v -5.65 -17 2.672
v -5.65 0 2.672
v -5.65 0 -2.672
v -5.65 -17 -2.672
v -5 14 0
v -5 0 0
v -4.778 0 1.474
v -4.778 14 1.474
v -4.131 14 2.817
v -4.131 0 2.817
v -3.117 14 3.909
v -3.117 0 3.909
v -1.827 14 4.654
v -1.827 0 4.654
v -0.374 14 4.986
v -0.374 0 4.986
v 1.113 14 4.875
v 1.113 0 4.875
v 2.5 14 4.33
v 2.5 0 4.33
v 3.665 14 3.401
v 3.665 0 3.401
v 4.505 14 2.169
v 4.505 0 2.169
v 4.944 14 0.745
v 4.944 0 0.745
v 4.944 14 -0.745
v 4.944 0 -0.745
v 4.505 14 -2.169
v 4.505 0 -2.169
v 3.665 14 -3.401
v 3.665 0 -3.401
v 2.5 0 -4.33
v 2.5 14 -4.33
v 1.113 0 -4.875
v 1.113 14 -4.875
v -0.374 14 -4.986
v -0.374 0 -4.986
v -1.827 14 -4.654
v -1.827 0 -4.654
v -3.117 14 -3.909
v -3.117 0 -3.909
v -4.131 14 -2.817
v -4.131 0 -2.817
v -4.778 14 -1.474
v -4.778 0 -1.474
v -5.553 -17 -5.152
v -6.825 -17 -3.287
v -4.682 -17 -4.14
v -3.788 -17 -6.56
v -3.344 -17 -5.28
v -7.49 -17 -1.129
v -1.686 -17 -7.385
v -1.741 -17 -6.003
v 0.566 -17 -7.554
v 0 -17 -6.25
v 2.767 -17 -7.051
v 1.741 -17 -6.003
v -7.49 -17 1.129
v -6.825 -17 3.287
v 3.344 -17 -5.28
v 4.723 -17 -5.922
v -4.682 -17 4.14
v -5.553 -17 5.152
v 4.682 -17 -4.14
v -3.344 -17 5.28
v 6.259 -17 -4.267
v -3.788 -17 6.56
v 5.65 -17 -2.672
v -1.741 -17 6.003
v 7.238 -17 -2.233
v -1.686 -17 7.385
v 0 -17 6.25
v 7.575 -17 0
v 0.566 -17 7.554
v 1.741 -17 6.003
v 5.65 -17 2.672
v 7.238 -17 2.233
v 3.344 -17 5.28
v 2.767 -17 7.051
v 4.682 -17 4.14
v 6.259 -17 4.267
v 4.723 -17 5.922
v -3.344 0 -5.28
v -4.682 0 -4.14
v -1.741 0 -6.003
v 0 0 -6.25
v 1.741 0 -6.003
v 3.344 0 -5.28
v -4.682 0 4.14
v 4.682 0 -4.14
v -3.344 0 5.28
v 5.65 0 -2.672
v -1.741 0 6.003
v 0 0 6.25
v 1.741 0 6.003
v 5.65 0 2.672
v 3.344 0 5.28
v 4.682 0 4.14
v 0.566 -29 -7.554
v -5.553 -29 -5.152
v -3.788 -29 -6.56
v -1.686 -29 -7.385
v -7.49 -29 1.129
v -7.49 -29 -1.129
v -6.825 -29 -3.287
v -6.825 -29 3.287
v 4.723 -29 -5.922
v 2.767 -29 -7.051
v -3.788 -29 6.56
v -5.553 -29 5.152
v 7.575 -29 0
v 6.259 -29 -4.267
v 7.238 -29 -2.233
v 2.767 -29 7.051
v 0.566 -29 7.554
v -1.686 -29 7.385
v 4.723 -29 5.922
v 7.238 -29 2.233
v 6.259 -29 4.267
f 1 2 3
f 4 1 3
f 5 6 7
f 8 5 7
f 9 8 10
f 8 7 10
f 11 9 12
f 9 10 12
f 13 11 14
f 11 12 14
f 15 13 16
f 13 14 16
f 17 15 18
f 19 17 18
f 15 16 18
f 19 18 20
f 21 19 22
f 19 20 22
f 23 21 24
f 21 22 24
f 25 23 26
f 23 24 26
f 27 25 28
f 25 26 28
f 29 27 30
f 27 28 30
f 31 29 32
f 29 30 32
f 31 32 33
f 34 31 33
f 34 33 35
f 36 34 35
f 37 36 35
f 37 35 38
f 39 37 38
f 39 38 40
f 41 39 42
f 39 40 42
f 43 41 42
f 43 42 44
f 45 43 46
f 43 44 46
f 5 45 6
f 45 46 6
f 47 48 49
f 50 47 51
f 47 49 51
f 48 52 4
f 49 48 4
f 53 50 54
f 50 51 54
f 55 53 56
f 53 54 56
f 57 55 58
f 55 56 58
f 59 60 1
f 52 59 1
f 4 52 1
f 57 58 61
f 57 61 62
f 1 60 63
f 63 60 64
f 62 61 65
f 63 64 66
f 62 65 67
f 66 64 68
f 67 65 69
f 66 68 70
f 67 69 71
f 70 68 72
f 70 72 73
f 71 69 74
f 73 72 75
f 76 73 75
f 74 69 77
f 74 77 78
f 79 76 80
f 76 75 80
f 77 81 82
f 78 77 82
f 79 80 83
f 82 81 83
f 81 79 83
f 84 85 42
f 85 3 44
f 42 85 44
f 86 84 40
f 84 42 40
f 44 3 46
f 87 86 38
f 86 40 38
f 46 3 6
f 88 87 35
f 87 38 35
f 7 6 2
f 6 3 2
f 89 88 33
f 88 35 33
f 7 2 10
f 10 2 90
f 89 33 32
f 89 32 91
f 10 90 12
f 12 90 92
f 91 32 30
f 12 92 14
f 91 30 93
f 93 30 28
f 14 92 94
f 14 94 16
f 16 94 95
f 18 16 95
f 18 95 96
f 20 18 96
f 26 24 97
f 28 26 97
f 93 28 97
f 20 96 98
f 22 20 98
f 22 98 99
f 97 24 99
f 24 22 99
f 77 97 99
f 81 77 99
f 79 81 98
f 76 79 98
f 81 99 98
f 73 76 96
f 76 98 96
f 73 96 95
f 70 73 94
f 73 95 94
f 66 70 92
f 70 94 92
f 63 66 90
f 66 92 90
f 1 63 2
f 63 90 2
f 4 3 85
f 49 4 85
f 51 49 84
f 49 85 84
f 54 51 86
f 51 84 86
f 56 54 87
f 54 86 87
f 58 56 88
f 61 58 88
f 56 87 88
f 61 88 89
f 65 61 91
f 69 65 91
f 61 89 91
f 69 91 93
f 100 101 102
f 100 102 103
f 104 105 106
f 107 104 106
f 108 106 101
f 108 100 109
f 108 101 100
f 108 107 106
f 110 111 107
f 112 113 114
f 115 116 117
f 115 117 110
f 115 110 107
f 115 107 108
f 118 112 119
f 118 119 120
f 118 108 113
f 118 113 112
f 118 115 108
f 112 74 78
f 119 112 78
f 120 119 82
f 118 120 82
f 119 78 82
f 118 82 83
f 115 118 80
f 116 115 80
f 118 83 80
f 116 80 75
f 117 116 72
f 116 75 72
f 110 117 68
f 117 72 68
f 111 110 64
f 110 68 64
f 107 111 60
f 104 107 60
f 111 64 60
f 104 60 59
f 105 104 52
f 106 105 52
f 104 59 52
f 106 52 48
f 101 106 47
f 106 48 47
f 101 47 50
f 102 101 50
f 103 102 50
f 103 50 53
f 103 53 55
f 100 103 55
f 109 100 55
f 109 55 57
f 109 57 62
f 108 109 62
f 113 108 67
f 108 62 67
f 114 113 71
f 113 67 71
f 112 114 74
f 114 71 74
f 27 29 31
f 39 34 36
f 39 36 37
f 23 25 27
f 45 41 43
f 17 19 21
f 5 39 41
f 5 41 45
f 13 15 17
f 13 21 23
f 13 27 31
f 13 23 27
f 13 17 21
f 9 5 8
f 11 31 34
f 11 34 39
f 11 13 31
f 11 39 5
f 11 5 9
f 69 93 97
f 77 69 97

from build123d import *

# Parameters (mm, degrees)
F0_R     = 6.25
F1_DEPTH = 17
F2_R     = 7.575
F3_DEPTH = 12
F5_DEPTH = 17
F6_R     = 5
F7_DEPTH = 14


with BuildPart() as f1:
    # F0 (on Front) → F1 (new body)
    with BuildSketch(Plane.XZ):
        Circle(F0_R)
    extrude(amount=F1_DEPTH)

    # F2 (on face) → F3 (join)
    with BuildSketch(Plane.XZ.offset(17)):
        Circle(F2_R)
    extrude(amount=F3_DEPTH)

    # F4 (on face) → F5 (cut, through all)
    with BuildSketch(Plane(origin=(0, 0, 0), x_dir=(-1, 0, 0), z_dir=(0, 1, 0))):
        with BuildLine():
            Line((-5.65, -2.6720778432), (-5.65, 2.6720778432))
            ThreePointArc((-5.65, 2.6720778432), (-6.25, 0), (-5.65, -2.6720778432))
        make_face()
        with BuildLine():
            ThreePointArc((6.25, 0), (6.0981554588, 1.3693063938), (5.65, 2.6720778432))
            Line((5.65, 2.6720778432), (5.65, -2.6720778432))
            ThreePointArc((5.65, -2.6720778432), (6.0981554588, -1.3693063938), (6.25, 0))
        make_face()
    extrude(amount=-F5_DEPTH, mode=Mode.SUBTRACT)

    # F6 (on face) → F7 (join)
    with BuildSketch(Plane(origin=(0, 0, 0), x_dir=(-1, 0, 0), z_dir=(0, 1, 0))):
        Circle(F6_R)
    extrude(amount=F7_DEPTH)


solid = f1.part
